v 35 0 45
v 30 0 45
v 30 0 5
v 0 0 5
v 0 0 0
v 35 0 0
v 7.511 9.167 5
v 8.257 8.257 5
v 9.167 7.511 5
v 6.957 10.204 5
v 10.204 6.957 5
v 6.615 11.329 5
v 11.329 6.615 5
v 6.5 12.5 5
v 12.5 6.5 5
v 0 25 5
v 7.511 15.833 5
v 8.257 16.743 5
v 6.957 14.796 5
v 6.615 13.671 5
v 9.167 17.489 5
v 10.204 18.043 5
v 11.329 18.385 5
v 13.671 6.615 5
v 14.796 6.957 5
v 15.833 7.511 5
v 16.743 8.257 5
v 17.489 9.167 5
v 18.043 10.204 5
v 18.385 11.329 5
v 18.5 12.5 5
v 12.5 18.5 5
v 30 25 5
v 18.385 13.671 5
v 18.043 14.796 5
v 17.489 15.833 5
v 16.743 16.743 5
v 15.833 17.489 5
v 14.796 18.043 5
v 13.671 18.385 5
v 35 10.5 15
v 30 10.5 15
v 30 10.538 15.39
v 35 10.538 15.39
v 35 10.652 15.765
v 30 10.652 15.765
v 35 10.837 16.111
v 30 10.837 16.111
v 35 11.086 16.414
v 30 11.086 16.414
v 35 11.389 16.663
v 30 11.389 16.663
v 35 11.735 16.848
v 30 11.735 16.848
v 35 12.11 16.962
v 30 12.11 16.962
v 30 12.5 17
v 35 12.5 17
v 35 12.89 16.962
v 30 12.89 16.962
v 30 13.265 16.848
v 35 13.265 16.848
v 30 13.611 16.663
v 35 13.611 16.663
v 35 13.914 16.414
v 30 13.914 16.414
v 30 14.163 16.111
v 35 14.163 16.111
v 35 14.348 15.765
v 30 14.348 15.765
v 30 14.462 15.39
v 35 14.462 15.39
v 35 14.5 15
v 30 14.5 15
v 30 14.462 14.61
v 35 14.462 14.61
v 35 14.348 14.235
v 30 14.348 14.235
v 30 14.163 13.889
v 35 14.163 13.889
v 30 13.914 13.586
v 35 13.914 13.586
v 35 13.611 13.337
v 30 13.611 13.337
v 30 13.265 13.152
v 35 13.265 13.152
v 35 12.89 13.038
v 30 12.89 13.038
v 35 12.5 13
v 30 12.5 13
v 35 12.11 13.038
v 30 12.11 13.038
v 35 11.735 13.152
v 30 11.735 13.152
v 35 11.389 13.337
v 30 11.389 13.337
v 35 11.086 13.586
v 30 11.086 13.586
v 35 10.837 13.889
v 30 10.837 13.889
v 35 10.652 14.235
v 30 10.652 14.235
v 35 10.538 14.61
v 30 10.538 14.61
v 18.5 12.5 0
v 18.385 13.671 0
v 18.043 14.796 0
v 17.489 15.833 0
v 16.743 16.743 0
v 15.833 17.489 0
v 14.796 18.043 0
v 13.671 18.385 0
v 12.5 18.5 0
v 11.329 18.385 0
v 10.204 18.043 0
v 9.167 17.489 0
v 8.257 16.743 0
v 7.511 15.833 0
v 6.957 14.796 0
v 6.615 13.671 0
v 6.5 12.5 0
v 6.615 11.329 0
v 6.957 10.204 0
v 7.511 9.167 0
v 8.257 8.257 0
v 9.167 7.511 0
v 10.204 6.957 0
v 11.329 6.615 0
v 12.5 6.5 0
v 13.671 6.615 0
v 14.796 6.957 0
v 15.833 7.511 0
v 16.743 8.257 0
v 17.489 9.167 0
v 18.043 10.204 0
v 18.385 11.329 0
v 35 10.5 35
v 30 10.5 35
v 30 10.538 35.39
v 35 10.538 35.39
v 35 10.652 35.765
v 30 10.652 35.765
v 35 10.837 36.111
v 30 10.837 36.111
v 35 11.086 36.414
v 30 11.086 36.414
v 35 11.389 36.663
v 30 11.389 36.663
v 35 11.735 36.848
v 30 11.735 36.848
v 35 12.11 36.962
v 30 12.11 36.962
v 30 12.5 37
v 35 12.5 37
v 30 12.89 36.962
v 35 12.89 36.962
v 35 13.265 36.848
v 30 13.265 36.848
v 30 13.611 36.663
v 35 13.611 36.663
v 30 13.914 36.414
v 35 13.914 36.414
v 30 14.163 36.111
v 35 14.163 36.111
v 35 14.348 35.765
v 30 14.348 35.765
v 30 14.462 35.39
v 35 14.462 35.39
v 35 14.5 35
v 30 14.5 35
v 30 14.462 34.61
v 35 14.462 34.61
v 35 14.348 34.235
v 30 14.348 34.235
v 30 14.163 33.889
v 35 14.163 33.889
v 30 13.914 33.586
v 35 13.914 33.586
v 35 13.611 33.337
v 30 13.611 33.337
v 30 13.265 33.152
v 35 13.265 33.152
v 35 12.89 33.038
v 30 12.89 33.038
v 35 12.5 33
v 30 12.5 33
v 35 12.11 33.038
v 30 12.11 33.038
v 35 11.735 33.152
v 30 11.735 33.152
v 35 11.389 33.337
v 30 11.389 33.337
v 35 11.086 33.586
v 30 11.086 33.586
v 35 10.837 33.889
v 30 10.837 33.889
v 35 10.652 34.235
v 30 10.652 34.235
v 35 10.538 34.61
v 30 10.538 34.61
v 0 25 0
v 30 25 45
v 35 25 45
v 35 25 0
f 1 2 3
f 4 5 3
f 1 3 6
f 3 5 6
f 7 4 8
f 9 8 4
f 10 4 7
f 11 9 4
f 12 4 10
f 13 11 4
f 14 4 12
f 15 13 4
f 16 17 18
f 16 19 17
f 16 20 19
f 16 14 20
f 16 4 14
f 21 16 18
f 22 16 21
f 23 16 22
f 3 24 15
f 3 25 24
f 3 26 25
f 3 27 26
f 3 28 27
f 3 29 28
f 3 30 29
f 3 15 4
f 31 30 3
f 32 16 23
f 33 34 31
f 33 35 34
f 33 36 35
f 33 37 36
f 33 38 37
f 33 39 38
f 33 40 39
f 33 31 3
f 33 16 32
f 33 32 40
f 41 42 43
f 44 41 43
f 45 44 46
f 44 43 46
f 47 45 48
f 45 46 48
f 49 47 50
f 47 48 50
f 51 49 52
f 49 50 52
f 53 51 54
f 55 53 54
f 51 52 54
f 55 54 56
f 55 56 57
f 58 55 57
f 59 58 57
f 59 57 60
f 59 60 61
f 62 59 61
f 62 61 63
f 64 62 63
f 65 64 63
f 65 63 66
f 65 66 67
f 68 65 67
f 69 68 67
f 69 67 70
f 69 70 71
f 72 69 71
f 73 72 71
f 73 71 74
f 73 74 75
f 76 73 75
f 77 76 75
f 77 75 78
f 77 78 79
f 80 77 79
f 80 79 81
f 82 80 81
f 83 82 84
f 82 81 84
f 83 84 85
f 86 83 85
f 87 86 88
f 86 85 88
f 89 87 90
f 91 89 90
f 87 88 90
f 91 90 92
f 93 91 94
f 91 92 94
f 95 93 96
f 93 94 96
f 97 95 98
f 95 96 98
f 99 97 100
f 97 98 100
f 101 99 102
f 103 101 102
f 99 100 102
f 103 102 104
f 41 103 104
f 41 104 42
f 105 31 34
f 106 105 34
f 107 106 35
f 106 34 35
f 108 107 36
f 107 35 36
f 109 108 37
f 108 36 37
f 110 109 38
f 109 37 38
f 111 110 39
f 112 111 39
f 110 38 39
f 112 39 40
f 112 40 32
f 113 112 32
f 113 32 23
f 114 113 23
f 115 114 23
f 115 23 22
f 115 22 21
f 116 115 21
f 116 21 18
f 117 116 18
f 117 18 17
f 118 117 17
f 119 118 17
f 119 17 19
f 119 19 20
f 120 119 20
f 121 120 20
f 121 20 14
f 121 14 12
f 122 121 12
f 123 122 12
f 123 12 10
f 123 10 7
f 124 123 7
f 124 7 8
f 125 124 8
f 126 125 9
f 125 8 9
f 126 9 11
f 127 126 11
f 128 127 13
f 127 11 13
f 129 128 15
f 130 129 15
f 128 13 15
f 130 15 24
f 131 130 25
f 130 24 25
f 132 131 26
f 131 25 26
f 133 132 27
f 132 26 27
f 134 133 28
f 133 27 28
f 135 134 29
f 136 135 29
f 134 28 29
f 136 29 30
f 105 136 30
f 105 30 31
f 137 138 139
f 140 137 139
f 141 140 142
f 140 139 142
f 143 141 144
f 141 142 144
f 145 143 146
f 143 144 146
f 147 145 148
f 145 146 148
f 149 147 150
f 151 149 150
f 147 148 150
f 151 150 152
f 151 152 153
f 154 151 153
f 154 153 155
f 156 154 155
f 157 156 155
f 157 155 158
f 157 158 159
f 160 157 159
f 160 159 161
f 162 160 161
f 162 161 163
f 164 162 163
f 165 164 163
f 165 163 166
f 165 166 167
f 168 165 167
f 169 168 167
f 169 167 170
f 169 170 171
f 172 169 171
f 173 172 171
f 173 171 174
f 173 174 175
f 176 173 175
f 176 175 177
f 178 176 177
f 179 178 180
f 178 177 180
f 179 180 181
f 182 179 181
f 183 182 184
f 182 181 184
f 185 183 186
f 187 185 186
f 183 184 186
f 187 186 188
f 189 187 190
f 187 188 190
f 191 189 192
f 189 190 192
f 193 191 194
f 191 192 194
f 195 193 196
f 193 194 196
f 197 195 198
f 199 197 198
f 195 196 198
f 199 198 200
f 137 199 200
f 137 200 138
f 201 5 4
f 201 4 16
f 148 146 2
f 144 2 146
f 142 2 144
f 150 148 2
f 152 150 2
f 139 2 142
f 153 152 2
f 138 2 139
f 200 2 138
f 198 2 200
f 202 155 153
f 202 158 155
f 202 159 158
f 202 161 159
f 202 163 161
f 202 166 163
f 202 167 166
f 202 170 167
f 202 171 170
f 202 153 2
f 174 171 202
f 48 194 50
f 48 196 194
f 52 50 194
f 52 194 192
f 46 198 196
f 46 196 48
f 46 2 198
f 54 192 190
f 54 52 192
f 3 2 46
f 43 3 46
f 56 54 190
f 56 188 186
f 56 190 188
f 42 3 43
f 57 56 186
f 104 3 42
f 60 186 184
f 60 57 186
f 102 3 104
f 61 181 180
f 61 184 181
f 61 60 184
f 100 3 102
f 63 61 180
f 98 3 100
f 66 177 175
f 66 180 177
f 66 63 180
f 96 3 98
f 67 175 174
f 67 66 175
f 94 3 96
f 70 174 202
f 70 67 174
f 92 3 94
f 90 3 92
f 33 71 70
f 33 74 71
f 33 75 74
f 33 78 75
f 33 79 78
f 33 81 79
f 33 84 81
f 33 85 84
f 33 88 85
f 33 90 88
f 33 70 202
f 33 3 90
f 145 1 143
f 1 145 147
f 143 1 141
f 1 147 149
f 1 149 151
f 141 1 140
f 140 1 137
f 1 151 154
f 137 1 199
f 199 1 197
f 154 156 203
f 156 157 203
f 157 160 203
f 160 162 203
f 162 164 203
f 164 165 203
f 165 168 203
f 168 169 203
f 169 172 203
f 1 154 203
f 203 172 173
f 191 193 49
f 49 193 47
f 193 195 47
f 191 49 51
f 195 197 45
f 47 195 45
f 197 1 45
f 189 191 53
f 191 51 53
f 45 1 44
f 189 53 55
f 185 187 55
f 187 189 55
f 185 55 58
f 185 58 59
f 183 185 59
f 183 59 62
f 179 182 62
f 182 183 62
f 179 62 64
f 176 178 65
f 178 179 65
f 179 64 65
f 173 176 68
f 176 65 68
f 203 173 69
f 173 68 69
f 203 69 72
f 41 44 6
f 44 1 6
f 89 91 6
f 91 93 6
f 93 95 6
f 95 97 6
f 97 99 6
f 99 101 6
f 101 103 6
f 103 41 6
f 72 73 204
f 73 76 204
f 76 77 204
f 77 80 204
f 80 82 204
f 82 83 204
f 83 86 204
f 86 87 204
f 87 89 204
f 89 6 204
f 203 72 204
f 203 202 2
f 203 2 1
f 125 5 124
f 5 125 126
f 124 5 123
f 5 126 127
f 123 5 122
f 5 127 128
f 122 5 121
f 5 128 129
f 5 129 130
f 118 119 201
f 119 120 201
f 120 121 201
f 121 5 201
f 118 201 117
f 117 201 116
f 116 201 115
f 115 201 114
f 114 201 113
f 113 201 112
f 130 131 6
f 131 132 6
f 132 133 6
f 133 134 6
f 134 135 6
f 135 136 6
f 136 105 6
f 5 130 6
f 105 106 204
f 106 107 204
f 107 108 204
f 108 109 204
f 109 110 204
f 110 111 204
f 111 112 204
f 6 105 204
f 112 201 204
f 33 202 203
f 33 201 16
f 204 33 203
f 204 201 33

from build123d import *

# Parameters (mm, degrees)
SKETCH1_W           = 35
SKETCH1_H           = 25
BOSS_EXTRUDE1_DEPTH = 5
SKETCH2_W           = 5
SKETCH2_H           = 25
BOSS_EXTRUDE2_DEPTH = 40
SKETCH3_R           = 6
CUT_EXTRUDE1_DEPTH  = 59.736700622
SKETCH4_R           = 2
CUT_EXTRUDE2_DEPTH  = 60.581876439


with BuildPart() as part:
    # Sketch1 → Boss-Extrude1 (new body)
    with BuildSketch(Plane.XY):
        with Locations((17.5, 12.5)):
            Rectangle(SKETCH1_W, SKETCH1_H)
    extrude(amount=BOSS_EXTRUDE1_DEPTH)

    # Sketch2 → Boss-Extrude2 (add)
    with BuildSketch(Plane.XY.offset(5)):
        with Locations((32.5, 12.5)):
            Rectangle(SKETCH2_W, SKETCH2_H)
    extrude(amount=BOSS_EXTRUDE2_DEPTH)

    # Sketch3 → Cut-Extrude1 (cut, through all)
    with BuildSketch(Plane.XY.offset(5)):
        with Locations((12.5, 12.5)):
            Circle(SKETCH3_R)
    extrude(amount=-CUT_EXTRUDE1_DEPTH, mode=Mode.SUBTRACT)

    # Sketch4 → Cut-Extrude2 (cut, through all)
    with BuildSketch(Plane.ZY.offset(-30)):
        with Locations(Location((15, 12.5, 0), (0, 0, 270))):
            Circle(SKETCH4_R)
        with Locations(Location((35, 12.5, 0), (0, 0, 270))):
            Circle(SKETCH4_R)
    extrude(amount=-CUT_EXTRUDE2_DEPTH, mode=Mode.SUBTRACT)


solid = part.part
